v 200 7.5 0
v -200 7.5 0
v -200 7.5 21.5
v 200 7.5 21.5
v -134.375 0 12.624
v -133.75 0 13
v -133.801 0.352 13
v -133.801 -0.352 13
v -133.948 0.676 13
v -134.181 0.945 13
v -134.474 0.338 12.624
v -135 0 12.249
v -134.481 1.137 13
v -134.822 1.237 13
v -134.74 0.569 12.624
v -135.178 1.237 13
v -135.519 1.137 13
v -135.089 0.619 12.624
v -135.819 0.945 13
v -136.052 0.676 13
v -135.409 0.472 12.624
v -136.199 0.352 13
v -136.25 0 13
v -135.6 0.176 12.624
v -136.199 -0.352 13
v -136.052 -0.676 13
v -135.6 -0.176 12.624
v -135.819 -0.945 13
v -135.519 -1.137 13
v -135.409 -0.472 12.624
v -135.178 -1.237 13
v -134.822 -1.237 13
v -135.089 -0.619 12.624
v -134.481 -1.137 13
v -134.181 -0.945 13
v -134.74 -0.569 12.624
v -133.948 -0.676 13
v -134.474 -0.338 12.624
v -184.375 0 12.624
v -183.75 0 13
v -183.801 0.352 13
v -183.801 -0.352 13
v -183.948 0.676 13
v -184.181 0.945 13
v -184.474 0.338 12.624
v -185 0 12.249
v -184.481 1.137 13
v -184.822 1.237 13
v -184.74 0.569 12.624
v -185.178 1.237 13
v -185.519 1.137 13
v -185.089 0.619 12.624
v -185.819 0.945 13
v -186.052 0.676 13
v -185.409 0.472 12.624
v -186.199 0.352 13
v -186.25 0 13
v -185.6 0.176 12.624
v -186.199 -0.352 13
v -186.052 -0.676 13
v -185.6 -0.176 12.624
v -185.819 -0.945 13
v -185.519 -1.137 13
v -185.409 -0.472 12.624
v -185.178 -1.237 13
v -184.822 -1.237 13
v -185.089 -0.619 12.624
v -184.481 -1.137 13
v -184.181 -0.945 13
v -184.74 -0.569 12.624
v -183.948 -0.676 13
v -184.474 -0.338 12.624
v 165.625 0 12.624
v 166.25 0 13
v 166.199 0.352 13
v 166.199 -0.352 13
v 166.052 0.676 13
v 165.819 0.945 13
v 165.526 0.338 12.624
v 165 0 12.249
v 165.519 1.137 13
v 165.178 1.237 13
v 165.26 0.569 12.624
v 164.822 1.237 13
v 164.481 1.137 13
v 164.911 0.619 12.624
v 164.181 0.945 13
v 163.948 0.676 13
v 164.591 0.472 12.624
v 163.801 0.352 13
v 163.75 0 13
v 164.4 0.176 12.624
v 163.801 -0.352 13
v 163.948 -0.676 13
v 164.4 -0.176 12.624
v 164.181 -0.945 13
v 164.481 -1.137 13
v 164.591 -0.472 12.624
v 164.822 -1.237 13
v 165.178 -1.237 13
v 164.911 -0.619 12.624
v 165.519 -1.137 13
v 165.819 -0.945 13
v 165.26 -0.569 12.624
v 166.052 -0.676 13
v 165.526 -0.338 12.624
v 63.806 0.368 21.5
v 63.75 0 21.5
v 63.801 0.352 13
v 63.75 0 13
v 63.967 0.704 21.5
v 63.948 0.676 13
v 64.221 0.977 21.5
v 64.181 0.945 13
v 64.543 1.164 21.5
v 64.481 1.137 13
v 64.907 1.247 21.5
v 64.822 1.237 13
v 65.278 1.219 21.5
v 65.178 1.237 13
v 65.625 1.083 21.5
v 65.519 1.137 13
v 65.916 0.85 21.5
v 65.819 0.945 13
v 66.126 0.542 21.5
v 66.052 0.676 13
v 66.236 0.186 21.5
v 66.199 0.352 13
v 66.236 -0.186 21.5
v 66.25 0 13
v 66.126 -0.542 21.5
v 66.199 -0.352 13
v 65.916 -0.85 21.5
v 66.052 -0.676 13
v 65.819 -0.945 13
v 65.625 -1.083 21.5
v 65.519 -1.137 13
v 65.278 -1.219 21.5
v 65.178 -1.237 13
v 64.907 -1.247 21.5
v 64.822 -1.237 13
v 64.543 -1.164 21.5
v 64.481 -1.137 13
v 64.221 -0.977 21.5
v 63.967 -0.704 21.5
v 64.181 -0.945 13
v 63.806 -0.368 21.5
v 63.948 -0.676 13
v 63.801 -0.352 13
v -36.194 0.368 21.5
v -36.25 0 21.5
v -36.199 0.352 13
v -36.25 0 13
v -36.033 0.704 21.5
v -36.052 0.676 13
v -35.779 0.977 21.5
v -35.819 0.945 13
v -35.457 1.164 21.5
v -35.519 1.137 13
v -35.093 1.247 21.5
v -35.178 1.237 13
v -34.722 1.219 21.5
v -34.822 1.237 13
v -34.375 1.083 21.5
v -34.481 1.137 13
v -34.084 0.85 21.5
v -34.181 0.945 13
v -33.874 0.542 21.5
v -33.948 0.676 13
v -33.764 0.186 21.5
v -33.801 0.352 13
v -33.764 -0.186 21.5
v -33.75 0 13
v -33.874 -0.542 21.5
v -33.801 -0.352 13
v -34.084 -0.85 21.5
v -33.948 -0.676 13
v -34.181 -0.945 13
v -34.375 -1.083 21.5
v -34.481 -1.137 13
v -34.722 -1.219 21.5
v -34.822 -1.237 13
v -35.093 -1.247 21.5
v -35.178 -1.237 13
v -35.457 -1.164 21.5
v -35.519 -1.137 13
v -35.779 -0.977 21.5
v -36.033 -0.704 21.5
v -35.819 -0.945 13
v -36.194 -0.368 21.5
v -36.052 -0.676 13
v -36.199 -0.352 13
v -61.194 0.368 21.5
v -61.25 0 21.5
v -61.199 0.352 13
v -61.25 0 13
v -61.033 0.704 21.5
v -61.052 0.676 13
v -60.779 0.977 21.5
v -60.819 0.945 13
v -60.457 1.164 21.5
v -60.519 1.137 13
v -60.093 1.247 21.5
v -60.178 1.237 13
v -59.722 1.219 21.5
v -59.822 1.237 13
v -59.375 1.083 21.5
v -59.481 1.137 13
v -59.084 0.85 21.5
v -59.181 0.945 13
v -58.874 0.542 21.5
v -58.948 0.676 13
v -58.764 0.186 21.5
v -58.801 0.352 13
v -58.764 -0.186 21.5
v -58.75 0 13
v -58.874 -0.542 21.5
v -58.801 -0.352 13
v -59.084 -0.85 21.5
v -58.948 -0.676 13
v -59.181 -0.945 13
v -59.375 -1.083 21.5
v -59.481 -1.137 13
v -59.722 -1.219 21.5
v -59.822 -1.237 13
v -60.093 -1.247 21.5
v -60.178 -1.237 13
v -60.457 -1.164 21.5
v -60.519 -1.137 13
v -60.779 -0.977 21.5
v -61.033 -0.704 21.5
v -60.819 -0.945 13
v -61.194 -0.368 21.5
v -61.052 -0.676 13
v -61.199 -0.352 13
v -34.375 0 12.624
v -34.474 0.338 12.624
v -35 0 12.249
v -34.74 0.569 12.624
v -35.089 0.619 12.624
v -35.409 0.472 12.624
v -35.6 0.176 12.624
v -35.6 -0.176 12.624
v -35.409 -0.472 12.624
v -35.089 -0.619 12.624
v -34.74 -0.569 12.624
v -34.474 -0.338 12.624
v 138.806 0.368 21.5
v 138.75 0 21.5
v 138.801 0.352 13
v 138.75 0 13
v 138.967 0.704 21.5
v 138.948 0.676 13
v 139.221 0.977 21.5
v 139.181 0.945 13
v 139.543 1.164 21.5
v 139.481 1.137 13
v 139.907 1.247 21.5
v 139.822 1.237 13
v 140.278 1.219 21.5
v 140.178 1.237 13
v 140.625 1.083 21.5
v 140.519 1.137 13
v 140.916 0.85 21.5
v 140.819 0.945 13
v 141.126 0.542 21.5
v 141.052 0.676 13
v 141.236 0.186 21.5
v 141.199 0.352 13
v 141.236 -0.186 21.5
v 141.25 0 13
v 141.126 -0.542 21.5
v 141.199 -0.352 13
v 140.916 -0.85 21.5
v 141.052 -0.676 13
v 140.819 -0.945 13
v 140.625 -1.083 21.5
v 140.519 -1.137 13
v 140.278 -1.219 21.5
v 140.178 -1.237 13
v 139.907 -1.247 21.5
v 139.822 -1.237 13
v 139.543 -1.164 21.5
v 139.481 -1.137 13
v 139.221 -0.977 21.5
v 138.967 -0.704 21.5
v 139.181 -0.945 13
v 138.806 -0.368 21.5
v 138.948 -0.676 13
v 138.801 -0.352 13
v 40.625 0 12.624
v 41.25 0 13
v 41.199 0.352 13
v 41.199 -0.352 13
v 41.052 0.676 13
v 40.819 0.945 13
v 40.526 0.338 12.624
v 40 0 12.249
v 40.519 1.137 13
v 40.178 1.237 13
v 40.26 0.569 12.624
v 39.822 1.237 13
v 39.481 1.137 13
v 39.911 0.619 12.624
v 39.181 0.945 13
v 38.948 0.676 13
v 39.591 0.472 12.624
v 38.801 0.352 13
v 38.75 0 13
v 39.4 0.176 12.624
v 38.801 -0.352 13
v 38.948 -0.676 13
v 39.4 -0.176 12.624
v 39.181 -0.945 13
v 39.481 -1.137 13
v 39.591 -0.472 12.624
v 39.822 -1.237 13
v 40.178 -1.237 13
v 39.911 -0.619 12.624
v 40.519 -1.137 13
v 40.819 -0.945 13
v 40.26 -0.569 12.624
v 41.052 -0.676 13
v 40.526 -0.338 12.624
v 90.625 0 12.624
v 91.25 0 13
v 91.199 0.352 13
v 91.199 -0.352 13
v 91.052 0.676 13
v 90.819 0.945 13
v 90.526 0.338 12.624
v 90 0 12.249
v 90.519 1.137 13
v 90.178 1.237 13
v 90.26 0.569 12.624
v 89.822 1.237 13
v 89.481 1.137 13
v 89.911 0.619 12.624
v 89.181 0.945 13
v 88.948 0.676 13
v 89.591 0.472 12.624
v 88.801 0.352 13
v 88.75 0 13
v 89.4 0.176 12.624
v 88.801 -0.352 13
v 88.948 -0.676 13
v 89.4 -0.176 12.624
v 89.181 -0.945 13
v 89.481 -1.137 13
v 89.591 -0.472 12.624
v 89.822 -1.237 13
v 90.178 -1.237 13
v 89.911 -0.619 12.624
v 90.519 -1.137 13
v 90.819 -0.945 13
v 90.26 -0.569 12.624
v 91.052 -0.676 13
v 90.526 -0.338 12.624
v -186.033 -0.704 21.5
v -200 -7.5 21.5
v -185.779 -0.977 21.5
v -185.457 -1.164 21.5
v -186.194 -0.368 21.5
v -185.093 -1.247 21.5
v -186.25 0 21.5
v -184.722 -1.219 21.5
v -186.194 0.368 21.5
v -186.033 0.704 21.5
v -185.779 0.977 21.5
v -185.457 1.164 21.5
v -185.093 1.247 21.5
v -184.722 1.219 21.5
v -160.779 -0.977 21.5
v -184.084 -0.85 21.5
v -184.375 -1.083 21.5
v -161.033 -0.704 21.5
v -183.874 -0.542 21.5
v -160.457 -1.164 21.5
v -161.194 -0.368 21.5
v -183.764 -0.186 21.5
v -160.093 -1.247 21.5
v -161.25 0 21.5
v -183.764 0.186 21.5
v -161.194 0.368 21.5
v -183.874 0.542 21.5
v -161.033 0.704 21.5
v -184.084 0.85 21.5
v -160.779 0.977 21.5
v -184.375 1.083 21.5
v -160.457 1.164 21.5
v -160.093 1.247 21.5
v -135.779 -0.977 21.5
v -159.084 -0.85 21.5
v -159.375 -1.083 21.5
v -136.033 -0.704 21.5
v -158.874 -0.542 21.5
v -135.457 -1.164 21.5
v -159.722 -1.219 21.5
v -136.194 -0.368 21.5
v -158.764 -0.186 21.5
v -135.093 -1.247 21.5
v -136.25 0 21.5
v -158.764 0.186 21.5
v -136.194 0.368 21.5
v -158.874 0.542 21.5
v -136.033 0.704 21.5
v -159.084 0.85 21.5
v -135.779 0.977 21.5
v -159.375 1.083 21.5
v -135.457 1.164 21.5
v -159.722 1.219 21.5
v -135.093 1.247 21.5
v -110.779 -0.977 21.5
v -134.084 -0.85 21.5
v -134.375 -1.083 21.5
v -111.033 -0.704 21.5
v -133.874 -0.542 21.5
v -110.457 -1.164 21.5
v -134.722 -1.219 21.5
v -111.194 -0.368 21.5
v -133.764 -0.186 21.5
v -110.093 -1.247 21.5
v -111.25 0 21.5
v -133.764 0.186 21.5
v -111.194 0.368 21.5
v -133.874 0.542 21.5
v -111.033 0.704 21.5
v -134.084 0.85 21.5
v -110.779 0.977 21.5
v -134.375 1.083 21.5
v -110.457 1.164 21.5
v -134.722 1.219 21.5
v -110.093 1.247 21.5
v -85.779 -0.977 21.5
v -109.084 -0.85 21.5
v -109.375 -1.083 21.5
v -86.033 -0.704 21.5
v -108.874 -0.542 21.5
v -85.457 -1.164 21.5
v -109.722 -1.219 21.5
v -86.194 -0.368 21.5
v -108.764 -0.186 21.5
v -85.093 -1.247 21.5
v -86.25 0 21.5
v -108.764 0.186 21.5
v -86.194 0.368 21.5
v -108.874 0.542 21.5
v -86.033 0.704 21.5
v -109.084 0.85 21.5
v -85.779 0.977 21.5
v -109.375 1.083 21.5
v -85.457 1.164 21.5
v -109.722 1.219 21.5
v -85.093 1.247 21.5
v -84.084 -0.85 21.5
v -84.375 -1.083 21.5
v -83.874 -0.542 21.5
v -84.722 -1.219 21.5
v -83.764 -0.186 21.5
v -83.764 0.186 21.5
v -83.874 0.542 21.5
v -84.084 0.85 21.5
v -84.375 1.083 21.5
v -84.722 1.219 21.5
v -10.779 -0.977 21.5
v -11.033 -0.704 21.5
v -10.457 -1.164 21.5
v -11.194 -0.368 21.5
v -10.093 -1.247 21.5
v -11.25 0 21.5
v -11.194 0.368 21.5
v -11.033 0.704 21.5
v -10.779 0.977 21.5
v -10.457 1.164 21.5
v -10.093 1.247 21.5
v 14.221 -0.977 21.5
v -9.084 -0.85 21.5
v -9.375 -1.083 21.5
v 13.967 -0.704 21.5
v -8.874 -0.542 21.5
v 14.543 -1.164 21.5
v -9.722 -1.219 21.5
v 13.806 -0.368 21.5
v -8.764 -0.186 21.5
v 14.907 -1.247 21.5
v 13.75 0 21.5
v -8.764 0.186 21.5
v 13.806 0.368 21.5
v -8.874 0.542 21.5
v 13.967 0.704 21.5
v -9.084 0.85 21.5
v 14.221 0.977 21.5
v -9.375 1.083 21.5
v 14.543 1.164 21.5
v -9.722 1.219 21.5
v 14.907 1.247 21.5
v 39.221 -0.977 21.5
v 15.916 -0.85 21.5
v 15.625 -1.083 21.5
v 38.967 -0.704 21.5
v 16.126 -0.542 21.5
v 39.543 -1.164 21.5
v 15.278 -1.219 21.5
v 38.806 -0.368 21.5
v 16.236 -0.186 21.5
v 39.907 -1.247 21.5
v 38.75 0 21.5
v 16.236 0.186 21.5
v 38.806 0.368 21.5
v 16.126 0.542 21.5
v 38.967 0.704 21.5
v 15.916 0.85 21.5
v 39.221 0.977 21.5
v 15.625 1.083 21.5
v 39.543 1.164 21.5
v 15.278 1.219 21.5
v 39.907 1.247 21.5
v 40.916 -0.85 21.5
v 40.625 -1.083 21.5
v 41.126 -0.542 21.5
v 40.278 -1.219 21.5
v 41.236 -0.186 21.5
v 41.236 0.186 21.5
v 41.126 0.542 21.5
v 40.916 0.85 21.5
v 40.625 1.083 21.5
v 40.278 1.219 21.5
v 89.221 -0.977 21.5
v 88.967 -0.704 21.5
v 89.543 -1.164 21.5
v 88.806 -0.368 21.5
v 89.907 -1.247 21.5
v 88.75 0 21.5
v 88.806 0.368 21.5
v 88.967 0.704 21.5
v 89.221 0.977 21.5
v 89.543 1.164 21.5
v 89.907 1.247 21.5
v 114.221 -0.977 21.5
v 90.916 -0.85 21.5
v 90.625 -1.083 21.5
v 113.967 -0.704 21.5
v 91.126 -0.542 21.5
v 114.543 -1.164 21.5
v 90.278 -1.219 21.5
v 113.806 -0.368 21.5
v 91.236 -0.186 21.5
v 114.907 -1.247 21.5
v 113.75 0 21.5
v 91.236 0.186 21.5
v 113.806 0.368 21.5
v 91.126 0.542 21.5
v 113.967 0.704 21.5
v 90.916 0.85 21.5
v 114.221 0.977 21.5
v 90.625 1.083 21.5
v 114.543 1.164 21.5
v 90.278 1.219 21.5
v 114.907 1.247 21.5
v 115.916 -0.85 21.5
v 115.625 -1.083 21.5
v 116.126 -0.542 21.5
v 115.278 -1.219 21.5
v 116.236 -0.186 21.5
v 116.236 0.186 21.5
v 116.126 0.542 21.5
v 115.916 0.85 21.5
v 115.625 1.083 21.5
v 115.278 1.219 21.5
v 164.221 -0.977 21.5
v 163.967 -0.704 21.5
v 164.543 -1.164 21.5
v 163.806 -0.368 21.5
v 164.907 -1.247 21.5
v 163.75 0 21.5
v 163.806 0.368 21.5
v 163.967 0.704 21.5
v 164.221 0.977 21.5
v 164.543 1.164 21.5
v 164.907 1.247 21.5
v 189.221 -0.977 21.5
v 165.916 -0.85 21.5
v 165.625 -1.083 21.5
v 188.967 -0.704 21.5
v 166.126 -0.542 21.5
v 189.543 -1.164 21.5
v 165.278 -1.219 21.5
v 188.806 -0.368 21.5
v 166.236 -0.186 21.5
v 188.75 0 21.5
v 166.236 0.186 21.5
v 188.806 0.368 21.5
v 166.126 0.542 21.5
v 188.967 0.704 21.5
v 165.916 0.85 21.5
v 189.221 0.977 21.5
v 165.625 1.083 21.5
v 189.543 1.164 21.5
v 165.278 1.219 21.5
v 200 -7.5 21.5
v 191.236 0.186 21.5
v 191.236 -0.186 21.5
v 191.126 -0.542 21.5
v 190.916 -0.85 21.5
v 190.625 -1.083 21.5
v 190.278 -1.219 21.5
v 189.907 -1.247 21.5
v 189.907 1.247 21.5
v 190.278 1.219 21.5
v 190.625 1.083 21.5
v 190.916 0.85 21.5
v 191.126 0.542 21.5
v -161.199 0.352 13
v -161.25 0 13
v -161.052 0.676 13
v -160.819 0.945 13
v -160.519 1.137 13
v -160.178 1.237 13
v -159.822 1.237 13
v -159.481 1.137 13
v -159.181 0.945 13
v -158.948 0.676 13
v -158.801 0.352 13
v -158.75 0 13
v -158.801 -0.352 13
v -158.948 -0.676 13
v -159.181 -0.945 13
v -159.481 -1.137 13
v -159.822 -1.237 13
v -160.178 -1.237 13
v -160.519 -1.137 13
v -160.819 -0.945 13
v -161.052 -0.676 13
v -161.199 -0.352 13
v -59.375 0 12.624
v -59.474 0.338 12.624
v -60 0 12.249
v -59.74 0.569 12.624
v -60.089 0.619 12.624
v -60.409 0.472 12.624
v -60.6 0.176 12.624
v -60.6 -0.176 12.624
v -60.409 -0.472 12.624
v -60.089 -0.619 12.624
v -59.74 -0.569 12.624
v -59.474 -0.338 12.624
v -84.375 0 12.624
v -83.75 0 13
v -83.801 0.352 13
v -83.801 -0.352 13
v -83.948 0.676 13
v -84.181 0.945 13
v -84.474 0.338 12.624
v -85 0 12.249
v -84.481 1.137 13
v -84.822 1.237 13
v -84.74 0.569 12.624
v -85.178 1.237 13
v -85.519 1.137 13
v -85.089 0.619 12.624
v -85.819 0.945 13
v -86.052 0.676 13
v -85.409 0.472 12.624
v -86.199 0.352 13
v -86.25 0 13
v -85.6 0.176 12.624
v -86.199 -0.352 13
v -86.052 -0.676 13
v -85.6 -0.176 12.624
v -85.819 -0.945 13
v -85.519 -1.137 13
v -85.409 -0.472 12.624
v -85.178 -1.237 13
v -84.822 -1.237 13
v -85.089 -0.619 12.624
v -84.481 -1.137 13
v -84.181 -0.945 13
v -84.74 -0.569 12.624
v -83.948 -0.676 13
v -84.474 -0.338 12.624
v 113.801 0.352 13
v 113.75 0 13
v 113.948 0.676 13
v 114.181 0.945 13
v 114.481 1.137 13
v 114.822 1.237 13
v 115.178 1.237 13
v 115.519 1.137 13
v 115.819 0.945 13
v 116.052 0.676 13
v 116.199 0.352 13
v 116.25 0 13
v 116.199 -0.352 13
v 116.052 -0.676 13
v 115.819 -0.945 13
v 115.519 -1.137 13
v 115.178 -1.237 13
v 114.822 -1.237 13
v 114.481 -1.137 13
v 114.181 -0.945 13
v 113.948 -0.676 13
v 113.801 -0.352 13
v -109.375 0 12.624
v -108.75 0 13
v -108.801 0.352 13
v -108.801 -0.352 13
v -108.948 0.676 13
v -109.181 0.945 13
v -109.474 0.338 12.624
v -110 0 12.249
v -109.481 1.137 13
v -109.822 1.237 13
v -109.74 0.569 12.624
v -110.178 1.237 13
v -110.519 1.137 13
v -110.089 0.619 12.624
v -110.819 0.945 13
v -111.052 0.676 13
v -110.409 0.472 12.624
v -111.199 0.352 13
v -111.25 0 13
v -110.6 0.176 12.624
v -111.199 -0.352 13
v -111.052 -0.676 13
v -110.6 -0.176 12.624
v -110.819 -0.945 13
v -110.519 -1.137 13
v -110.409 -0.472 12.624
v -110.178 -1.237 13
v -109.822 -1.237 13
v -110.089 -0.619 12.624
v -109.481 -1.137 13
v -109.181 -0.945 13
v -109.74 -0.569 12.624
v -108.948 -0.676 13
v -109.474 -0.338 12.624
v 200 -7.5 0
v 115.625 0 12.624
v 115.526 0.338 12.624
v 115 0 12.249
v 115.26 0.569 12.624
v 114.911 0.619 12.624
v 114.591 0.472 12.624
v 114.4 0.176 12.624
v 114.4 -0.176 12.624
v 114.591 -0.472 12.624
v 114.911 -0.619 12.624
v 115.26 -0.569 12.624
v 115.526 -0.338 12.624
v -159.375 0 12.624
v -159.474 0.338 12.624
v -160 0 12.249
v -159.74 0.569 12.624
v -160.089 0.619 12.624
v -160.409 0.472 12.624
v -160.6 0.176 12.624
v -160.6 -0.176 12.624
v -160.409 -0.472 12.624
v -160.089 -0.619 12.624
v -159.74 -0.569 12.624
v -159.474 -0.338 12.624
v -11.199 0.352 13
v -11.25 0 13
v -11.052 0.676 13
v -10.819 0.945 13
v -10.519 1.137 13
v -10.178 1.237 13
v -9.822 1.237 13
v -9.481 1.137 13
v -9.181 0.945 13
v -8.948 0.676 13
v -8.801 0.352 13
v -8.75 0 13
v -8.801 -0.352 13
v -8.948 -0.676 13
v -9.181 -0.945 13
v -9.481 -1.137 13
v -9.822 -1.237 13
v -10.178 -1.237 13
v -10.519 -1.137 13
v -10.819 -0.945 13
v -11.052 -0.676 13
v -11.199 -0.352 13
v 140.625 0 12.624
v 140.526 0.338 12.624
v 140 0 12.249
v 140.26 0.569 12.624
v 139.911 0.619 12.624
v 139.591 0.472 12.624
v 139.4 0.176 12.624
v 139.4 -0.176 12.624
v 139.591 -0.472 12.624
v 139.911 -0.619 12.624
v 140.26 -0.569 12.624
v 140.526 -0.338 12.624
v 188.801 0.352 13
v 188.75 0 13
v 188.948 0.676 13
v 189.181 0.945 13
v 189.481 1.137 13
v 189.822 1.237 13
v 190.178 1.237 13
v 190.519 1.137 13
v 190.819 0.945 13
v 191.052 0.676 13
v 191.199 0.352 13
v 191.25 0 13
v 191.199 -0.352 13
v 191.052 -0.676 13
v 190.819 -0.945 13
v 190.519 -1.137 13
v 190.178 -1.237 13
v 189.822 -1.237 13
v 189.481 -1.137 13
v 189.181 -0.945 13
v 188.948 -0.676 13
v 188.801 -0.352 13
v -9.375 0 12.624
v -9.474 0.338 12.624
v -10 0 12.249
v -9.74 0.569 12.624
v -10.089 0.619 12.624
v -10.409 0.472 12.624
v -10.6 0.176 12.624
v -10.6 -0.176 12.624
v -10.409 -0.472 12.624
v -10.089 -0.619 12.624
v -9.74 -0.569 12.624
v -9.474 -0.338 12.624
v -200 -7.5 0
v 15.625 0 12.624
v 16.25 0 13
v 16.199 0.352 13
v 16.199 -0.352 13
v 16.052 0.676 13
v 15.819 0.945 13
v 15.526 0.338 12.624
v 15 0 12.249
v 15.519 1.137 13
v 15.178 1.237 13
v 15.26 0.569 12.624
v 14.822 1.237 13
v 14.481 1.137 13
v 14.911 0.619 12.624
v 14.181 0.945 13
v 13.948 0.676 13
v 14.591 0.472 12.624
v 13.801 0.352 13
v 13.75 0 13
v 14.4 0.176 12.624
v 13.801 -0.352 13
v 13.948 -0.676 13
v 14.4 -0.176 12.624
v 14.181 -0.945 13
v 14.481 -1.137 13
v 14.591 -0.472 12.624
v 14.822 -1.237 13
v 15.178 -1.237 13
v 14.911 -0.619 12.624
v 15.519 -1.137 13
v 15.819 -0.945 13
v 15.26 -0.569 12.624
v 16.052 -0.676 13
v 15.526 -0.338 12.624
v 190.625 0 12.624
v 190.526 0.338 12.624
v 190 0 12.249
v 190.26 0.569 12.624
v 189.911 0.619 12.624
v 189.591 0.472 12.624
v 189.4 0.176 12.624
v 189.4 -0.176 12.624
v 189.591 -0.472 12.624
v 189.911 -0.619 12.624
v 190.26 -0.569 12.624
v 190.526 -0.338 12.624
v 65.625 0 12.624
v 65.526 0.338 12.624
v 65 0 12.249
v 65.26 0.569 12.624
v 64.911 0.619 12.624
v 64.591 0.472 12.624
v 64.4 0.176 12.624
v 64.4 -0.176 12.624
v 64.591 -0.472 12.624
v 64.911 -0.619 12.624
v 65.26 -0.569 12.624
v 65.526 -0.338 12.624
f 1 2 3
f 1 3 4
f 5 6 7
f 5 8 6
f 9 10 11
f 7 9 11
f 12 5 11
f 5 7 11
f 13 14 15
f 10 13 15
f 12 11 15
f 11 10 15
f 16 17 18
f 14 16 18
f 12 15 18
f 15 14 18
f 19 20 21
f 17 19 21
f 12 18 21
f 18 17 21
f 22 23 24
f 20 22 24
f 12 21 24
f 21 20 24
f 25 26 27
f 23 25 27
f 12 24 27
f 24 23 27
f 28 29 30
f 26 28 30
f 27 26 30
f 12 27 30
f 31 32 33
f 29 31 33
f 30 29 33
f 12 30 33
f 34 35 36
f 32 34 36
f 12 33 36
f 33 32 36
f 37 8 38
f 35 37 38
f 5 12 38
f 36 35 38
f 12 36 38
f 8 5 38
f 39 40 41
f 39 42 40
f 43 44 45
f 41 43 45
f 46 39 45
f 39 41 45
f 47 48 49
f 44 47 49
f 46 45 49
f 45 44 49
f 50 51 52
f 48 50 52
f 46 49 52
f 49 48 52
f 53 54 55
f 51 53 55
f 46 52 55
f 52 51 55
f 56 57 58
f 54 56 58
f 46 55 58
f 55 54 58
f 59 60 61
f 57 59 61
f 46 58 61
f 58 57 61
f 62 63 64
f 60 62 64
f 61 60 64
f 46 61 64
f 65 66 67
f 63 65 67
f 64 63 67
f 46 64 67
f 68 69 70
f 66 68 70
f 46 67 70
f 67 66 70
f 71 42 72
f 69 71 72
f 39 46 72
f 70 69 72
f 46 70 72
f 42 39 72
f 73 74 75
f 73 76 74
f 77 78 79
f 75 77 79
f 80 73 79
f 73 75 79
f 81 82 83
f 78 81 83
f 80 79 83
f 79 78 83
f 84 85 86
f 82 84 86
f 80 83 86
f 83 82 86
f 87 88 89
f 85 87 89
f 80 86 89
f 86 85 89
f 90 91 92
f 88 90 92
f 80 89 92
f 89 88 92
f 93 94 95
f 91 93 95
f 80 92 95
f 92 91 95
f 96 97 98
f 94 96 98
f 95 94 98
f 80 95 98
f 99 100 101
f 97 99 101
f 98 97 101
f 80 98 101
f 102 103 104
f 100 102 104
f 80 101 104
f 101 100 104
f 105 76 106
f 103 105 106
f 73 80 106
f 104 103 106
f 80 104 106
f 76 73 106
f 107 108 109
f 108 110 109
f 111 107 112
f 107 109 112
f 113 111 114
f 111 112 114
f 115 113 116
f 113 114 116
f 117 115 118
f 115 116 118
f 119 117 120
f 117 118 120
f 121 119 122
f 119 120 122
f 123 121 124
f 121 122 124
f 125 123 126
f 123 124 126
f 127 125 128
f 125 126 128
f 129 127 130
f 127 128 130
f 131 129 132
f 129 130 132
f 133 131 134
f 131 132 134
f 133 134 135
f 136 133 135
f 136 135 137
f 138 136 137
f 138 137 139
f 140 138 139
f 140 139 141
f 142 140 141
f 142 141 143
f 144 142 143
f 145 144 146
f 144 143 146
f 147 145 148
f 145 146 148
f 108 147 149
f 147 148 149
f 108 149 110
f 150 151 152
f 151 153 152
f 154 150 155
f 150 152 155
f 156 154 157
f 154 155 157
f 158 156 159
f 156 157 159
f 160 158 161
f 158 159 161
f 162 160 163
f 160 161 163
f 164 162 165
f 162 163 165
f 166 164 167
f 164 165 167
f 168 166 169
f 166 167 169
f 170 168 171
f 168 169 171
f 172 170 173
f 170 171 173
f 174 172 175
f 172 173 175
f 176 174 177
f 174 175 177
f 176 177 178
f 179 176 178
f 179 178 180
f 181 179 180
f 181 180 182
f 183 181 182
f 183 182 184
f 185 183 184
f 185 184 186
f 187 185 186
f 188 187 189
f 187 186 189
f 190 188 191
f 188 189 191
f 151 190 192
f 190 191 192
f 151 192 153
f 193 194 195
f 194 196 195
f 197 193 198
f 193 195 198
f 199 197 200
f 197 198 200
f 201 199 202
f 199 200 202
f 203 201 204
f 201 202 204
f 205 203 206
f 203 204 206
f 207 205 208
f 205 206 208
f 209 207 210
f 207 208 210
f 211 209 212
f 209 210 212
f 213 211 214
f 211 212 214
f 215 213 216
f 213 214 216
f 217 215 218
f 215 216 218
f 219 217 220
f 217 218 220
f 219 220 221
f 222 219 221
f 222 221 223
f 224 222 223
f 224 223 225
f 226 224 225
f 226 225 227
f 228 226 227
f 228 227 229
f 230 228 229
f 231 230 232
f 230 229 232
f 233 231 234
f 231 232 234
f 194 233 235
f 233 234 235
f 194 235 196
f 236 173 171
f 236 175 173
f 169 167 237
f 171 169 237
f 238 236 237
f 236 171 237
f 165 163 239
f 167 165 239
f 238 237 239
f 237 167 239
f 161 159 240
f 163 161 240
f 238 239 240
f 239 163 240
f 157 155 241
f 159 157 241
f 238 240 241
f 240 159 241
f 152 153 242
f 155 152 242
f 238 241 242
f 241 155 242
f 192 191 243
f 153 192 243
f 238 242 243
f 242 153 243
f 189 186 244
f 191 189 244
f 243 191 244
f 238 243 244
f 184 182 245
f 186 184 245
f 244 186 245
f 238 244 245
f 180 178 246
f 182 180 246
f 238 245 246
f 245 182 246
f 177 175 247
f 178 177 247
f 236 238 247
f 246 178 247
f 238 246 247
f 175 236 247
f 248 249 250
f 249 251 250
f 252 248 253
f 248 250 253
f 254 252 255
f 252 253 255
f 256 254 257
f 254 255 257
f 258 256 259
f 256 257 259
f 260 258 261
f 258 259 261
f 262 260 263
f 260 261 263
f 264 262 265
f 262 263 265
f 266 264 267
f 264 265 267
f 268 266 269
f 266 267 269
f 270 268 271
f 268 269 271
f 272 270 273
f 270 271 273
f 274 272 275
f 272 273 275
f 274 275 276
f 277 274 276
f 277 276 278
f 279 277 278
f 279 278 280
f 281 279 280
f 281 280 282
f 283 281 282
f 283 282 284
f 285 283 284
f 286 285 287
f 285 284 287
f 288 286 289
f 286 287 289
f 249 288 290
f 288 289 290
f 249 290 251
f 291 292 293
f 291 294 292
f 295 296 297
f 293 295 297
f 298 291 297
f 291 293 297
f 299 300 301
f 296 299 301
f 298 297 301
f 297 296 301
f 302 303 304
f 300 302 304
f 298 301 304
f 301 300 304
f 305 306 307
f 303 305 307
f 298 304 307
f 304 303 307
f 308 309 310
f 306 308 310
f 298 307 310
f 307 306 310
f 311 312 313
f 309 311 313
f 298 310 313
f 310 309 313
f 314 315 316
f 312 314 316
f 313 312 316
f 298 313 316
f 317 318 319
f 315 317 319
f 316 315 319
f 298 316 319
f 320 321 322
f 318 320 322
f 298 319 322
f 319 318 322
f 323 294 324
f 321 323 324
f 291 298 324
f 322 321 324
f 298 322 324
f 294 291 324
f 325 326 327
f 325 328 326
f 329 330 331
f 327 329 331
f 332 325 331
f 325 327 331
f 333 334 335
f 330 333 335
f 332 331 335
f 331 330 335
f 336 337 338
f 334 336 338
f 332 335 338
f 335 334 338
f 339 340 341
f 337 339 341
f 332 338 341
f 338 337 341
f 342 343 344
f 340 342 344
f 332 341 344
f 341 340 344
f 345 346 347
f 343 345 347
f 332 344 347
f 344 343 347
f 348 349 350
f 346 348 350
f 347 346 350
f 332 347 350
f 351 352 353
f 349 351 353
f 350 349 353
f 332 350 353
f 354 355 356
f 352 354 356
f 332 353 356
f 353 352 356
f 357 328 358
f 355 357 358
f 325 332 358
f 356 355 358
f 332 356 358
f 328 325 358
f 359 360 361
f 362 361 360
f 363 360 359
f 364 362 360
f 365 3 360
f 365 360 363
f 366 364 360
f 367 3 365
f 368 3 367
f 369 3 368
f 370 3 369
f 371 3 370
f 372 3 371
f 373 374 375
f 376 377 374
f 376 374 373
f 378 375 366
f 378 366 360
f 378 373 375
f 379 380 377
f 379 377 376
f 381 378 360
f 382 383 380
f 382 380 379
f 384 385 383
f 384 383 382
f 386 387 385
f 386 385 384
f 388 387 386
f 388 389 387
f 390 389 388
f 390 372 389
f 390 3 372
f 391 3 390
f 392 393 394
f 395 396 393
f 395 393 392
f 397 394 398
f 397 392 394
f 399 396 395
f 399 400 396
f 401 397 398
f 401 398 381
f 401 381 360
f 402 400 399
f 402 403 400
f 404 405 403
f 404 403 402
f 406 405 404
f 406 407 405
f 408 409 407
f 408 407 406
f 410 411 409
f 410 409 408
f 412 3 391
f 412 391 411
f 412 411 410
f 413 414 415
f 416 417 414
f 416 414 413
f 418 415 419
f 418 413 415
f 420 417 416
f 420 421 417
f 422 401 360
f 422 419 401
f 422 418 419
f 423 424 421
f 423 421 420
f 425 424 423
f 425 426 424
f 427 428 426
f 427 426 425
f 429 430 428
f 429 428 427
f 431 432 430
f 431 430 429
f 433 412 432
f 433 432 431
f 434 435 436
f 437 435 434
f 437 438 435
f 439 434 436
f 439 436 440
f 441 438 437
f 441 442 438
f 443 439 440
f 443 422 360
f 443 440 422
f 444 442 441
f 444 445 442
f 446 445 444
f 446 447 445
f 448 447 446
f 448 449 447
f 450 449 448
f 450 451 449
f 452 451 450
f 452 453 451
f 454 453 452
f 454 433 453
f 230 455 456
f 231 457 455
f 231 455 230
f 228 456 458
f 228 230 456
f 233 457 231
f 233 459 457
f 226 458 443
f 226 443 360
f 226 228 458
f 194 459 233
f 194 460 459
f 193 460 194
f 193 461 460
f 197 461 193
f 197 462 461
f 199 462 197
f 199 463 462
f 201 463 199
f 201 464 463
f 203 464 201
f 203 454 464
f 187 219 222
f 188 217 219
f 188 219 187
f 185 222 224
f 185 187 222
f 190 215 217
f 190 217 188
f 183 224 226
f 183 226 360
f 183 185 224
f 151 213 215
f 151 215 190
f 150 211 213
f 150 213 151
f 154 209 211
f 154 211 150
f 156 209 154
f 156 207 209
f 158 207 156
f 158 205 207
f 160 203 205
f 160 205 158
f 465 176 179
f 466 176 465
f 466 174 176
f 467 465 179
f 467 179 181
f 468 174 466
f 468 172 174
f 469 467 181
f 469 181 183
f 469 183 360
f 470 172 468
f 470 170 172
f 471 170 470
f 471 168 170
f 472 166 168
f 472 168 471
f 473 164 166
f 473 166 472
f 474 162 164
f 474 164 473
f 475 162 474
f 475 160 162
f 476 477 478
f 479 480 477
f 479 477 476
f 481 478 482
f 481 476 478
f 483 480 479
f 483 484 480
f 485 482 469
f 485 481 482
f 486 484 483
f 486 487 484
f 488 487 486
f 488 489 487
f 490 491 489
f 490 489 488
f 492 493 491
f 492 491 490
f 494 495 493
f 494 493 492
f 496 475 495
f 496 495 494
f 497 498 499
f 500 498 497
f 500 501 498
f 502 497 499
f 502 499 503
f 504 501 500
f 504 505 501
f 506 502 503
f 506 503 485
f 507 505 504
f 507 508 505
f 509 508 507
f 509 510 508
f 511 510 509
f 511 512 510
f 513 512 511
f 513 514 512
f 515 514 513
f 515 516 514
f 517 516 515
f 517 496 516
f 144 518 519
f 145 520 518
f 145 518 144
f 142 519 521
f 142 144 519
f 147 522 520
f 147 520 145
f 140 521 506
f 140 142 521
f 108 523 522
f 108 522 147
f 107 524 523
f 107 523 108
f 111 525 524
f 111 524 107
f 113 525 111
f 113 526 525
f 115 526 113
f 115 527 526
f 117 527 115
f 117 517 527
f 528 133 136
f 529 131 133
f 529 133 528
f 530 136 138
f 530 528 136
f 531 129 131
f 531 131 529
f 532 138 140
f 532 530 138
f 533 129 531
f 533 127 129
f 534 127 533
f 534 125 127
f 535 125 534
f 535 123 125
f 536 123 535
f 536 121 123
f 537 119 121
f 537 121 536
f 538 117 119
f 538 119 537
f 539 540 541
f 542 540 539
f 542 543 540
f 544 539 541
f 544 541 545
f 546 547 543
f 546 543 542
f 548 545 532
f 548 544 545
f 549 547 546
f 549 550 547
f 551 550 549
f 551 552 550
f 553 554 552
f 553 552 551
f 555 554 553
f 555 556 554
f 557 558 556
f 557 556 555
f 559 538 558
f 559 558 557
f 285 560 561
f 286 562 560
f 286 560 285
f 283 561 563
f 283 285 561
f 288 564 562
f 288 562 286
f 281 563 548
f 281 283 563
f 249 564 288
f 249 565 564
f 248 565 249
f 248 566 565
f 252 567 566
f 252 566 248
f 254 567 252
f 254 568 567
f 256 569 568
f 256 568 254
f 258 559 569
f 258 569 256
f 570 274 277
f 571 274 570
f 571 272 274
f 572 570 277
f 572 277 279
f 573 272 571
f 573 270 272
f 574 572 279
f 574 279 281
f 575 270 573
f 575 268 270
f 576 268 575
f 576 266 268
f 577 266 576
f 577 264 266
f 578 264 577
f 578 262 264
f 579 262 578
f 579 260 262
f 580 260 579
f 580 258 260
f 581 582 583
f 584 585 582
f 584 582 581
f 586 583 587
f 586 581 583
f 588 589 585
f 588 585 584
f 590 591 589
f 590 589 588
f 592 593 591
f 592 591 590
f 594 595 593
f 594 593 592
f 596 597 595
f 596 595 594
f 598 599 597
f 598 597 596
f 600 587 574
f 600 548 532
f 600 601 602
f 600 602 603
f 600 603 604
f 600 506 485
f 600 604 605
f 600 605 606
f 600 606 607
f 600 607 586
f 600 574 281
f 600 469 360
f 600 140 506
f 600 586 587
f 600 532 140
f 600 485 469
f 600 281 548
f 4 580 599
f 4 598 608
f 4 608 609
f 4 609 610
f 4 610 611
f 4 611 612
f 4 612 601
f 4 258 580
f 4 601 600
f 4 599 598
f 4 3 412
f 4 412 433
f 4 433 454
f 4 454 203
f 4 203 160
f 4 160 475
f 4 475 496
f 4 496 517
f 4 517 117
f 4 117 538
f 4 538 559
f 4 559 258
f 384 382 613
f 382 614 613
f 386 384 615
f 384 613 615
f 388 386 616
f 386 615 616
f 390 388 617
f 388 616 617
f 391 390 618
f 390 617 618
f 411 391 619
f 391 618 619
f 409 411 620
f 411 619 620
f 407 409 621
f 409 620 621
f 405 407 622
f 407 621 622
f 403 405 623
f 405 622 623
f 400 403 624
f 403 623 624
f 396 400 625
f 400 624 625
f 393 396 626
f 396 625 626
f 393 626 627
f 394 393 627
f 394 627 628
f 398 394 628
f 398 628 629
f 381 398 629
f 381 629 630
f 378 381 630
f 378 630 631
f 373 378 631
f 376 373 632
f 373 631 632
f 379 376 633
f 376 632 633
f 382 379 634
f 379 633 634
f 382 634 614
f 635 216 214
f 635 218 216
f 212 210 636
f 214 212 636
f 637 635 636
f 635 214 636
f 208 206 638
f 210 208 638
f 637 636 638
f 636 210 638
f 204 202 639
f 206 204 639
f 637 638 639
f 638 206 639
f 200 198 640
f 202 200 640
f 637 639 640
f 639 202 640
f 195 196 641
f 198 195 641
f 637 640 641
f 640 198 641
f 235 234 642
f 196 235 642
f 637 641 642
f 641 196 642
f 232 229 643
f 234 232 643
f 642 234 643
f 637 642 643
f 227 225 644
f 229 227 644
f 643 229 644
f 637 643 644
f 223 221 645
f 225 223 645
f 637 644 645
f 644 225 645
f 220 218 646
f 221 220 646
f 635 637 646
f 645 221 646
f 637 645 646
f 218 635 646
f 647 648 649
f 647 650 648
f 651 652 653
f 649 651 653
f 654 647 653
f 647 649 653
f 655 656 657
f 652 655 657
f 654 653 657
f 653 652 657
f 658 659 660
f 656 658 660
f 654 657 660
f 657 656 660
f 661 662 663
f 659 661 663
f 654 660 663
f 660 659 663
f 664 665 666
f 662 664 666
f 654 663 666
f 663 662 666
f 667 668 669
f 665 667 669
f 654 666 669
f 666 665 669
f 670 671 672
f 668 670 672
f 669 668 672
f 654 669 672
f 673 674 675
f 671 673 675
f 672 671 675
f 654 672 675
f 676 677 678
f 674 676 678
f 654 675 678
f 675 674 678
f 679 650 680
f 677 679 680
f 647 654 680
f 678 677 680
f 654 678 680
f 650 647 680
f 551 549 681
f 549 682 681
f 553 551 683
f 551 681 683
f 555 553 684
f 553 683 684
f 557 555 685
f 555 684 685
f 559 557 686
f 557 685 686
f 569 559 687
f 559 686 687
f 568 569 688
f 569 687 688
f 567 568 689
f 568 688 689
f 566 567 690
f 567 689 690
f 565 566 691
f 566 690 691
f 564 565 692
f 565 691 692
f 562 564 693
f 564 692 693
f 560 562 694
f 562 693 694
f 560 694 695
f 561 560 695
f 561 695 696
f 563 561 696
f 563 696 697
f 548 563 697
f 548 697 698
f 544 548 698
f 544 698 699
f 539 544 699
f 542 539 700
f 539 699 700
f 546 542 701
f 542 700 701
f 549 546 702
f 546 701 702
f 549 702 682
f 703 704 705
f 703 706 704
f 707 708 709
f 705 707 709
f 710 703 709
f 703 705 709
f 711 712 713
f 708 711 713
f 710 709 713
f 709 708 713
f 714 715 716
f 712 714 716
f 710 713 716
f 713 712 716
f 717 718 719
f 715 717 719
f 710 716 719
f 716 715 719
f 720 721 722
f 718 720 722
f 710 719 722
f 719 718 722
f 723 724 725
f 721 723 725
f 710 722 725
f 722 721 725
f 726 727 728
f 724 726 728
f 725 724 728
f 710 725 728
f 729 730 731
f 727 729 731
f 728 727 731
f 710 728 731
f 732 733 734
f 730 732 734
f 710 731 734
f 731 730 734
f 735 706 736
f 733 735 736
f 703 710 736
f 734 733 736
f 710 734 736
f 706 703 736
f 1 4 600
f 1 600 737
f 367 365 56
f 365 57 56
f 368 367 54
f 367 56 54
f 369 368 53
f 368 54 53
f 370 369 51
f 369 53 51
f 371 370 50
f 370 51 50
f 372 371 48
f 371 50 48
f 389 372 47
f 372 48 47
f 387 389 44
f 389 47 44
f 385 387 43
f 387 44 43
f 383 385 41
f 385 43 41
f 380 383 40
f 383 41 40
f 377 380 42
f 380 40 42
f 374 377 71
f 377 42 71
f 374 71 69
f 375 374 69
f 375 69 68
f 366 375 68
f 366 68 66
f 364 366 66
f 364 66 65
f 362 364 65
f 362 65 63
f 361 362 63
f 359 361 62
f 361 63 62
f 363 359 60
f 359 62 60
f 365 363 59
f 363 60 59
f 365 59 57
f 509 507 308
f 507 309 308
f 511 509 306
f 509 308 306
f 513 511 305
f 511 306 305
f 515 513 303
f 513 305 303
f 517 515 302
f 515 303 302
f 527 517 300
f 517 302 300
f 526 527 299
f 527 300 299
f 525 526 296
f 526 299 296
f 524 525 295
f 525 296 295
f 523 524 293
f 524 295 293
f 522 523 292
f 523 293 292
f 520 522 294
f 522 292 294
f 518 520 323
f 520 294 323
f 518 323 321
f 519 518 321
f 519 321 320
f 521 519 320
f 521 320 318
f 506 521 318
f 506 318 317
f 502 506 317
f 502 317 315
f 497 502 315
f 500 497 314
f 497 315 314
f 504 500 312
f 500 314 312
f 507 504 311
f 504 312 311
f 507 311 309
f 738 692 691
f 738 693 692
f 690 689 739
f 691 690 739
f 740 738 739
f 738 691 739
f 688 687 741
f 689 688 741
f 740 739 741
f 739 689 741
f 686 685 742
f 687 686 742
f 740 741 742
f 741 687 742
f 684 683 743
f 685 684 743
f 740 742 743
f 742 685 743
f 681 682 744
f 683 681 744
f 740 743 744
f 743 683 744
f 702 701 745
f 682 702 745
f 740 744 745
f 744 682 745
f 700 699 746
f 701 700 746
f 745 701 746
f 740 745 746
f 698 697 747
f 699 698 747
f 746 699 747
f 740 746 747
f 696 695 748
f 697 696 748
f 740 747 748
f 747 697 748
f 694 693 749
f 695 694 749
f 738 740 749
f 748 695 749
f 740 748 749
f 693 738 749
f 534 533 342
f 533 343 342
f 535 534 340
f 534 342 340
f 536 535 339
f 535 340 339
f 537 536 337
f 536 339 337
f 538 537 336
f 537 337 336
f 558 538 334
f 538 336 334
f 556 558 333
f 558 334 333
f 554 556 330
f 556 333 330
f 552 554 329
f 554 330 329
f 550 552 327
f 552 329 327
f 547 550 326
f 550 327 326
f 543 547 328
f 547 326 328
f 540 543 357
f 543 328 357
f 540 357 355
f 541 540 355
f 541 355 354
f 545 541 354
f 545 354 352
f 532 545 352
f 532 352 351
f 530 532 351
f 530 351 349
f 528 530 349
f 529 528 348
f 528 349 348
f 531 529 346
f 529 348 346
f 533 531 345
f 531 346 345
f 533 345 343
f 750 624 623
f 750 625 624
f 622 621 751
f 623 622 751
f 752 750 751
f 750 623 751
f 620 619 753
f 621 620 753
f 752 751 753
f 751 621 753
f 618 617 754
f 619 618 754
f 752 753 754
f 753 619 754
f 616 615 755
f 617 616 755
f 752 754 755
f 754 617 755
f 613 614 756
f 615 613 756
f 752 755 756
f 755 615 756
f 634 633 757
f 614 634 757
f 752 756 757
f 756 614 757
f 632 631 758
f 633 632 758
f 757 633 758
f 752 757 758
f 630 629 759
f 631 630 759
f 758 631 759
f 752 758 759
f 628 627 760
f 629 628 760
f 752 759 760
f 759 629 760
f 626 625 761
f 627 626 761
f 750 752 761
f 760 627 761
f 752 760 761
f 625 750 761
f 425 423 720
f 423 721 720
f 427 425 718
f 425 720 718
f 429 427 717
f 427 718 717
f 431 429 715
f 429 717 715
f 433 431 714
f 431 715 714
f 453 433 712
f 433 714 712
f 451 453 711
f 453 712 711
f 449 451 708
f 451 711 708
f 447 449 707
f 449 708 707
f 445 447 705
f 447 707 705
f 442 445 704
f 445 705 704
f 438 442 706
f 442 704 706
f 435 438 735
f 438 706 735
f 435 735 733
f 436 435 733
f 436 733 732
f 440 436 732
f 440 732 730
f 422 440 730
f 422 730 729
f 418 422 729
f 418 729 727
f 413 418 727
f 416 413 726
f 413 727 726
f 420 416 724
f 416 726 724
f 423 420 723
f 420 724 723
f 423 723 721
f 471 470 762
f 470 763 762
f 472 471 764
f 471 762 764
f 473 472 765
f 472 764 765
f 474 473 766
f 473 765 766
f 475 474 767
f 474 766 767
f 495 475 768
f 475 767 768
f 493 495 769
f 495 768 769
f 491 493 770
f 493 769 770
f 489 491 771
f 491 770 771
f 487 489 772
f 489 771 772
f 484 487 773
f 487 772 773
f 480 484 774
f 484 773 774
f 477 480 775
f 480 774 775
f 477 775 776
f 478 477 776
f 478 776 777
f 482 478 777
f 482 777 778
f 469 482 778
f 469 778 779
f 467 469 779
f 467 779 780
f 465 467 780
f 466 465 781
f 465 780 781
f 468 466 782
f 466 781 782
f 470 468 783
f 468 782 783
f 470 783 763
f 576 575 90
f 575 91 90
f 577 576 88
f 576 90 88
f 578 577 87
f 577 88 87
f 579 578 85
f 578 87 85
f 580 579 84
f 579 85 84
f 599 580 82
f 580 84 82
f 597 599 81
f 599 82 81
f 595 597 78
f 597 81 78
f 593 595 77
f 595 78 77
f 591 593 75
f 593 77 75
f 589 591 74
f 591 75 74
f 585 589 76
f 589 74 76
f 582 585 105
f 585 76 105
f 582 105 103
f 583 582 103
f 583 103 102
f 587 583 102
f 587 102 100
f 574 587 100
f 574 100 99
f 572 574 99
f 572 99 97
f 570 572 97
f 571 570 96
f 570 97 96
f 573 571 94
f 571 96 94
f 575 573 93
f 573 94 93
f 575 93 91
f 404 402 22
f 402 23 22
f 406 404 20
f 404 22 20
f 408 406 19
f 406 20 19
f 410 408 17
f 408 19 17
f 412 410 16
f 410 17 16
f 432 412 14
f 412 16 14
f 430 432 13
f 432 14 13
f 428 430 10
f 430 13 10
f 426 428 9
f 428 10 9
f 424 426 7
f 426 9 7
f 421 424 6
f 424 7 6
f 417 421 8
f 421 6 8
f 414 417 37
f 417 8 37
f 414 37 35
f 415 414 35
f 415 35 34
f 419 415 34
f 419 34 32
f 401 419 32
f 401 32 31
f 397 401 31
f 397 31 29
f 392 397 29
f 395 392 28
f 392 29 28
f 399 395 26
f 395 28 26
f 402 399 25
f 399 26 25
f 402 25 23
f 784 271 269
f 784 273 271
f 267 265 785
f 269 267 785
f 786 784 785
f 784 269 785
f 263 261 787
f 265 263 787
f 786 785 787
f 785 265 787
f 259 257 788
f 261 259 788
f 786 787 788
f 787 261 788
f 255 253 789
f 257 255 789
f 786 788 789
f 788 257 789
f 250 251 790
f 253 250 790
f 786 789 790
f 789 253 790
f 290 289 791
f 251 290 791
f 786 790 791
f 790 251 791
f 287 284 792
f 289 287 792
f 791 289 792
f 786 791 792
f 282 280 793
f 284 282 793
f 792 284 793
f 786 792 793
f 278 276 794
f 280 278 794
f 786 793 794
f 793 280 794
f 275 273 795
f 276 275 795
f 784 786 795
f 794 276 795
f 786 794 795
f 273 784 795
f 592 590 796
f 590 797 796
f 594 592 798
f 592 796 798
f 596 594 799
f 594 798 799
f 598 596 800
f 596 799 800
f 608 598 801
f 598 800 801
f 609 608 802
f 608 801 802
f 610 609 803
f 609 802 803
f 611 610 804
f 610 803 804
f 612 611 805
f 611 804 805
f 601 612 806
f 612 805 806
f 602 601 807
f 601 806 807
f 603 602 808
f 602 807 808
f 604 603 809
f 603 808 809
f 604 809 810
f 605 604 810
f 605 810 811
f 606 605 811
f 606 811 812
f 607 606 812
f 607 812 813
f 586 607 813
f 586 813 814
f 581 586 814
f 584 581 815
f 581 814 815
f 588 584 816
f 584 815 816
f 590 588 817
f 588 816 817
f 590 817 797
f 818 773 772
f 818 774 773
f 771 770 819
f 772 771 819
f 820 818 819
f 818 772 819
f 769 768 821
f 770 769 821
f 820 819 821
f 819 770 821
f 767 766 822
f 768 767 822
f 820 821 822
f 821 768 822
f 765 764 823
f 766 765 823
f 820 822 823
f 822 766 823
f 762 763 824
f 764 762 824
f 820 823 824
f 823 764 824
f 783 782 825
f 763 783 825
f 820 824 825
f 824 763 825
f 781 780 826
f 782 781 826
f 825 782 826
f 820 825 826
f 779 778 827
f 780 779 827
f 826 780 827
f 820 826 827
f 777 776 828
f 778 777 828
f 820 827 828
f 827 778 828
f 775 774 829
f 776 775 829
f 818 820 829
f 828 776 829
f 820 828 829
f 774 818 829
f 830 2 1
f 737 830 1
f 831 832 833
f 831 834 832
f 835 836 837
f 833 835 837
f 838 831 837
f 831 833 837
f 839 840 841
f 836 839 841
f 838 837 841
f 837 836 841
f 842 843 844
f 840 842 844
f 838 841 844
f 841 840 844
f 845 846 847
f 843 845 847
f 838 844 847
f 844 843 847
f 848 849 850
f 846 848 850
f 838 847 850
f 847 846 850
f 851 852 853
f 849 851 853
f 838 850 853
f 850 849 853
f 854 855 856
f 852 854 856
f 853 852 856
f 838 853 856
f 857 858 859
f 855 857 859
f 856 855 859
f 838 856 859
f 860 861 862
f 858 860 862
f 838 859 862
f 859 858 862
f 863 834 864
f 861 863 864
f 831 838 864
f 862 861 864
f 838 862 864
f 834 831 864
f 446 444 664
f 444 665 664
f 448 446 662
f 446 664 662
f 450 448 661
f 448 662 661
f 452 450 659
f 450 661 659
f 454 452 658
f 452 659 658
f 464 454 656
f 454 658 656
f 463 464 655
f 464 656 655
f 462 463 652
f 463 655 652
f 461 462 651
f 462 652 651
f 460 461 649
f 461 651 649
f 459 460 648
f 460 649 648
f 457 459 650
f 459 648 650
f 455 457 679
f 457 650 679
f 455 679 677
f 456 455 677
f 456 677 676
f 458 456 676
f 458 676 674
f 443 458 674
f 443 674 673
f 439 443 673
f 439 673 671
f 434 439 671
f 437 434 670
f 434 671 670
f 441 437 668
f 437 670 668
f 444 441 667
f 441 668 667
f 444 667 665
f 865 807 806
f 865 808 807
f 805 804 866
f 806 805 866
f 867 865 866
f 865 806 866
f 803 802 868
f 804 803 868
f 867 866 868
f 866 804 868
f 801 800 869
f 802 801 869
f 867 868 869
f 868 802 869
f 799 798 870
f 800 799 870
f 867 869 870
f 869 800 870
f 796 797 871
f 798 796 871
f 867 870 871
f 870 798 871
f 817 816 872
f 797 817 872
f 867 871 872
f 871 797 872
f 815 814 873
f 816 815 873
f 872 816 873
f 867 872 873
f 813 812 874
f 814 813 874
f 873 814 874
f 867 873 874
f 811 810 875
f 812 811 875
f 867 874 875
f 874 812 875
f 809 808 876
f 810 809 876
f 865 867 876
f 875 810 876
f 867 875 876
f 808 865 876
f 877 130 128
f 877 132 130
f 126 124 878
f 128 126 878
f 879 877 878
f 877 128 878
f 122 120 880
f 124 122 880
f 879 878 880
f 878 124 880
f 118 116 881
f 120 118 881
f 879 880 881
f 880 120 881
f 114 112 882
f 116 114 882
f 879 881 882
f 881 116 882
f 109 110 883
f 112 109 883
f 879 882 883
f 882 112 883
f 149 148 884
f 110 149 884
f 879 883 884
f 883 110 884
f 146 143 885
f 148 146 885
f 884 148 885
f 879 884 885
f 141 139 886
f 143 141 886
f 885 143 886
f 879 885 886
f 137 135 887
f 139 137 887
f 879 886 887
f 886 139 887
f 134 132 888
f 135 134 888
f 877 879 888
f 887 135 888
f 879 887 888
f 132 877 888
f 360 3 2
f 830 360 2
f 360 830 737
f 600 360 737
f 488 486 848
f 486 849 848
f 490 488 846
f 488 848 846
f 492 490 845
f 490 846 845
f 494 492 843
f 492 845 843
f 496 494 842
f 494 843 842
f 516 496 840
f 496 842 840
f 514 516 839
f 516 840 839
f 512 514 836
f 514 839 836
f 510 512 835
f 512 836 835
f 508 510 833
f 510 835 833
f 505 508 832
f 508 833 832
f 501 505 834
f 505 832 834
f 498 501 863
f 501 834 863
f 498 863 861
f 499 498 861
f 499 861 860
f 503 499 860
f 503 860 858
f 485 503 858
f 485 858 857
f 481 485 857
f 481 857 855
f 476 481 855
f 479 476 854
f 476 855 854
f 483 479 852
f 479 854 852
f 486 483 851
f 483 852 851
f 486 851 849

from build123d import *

# Parameters (mm, degrees)
SKETCH_1_W                  = 400
SKETCH_1_H                  = 21.5
EXTRUDE_1_DEPTH             = 15
HOLE_WIZARD_2_5_2_5_1_D     = 2.5
HOLE_WIZARD_2_5_2_5_1_DEPTH = 8.5
HOLE_WIZARD_2_5_2_5_1_TIP   = 0.751075774


with BuildPart() as part:
    # 草图1 → 凸台-拉伸1 (new body)
    with BuildSketch(Plane(origin=(0, 7.5, 0), x_dir=(1, 0, 0), z_dir=(0, 1, 0))):
        with Locations((0, -10.75)):
            Rectangle(SKETCH_1_W, SKETCH_1_H)
    extrude(amount=-EXTRUDE_1_DEPTH)

    # Ø2.5 (2.5) 直径孔1
    with Locations(Plane.XY.offset(21.5)):
        with Locations((-185, 0), (-160, 0), (-135, 0), (-110, 0), (-85, 0), (-60, 0), (-35, 0), (-10, 0), (15, 0), (40, 0), (65, 0), (90, 0), (115, 0), (140, 0), (190, 0), (165, 0)):
            Hole(HOLE_WIZARD_2_5_2_5_1_D / 2, depth=HOLE_WIZARD_2_5_2_5_1_DEPTH)
            with Locations((0, 0, -(HOLE_WIZARD_2_5_2_5_1_DEPTH + HOLE_WIZARD_2_5_2_5_1_TIP / 2))):  # 118° drill point
                Cone(0, HOLE_WIZARD_2_5_2_5_1_D / 2, HOLE_WIZARD_2_5_2_5_1_TIP, mode=Mode.SUBTRACT)


solid = part.part
